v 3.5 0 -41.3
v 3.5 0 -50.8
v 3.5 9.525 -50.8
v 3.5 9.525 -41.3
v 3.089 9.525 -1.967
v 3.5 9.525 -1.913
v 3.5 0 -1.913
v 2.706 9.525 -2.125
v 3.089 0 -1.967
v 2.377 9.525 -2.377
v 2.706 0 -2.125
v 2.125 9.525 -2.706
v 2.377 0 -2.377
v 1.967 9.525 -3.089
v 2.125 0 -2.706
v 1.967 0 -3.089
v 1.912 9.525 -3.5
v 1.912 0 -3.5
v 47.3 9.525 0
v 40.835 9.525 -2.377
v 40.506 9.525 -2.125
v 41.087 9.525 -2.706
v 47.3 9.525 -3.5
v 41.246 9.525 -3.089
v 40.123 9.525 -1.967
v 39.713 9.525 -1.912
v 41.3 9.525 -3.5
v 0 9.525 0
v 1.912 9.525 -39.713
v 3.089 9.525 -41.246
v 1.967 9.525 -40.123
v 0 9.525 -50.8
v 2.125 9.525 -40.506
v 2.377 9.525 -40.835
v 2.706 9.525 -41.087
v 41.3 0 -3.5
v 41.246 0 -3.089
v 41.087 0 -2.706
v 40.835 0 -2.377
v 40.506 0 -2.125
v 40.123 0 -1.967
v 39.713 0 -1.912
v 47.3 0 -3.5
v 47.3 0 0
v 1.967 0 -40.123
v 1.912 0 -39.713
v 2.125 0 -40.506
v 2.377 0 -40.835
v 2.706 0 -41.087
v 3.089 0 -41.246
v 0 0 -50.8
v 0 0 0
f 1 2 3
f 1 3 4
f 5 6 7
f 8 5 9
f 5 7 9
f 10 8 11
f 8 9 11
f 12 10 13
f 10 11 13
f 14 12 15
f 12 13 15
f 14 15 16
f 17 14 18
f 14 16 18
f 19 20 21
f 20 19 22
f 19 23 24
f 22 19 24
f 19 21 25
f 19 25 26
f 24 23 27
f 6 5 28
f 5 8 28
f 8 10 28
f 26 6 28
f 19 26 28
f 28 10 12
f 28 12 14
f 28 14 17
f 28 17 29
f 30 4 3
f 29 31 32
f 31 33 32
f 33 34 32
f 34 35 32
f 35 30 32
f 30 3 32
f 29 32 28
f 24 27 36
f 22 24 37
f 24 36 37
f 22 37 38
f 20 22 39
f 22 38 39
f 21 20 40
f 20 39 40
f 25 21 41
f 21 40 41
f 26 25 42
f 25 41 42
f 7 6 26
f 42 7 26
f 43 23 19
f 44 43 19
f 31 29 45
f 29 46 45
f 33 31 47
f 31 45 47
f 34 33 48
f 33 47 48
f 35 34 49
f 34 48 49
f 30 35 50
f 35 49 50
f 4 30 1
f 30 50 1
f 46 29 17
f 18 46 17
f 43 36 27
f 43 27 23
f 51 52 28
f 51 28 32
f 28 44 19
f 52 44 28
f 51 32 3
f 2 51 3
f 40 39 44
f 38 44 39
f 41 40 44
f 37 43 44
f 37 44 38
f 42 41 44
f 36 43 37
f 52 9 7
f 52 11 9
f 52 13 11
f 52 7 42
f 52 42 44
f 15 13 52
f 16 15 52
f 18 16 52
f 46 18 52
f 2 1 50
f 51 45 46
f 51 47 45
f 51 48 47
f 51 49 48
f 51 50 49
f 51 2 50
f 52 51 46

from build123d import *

# Parameters (mm, degrees)
BOSS_EXTRUDE1_DEPTH = 9.525
CUT_EXTRUDE1_DEPTH  = 71.061798614
FILLET1_R           = 1.5875


with BuildPart() as part:
    # Sketch1 → Boss-Extrude1 (new body)
    with BuildSketch(Plane(origin=(0, 0, 0), x_dir=(1, 0, 0), z_dir=(0, 1, 0))):
        Polygon((0, 0), (0, 50.8), (3.5, 50.8), (3.5, 3.5), (47.3, 3.5), (47.3, 0), align=None)
    extrude(amount=BOSS_EXTRUDE1_DEPTH)

    # Sketch2 → Cut-Extrude1 (cut, through all)
    with BuildSketch(Plane(origin=(0, 9.525, 0), x_dir=(1, 0, 0), z_dir=(0, 1, 0))):
        Polygon((3.5, 41.3), (1.9125, 41.3), (1.9125, 3.5), (1.9125, 1.9125), (41.3, 1.9125), (41.3, 3.5), (3.5, 3.5), align=None)
    extrude(amount=-CUT_EXTRUDE1_DEPTH, mode=Mode.SUBTRACT)

    # Fillet1
    fillet1_edges = [part.edges().sort_by_distance(p)[0] for p in [
        (41.3, 4.7625, -1.9125),
        (1.9125, 4.7625, -1.9125),
        (1.9125, 4.7625, -41.3),
    ]]
    fillet(fillet1_edges, radius=FILLET1_R - 0.0001)  # a hair under: the kernel refuses the full size


solid = part.part
